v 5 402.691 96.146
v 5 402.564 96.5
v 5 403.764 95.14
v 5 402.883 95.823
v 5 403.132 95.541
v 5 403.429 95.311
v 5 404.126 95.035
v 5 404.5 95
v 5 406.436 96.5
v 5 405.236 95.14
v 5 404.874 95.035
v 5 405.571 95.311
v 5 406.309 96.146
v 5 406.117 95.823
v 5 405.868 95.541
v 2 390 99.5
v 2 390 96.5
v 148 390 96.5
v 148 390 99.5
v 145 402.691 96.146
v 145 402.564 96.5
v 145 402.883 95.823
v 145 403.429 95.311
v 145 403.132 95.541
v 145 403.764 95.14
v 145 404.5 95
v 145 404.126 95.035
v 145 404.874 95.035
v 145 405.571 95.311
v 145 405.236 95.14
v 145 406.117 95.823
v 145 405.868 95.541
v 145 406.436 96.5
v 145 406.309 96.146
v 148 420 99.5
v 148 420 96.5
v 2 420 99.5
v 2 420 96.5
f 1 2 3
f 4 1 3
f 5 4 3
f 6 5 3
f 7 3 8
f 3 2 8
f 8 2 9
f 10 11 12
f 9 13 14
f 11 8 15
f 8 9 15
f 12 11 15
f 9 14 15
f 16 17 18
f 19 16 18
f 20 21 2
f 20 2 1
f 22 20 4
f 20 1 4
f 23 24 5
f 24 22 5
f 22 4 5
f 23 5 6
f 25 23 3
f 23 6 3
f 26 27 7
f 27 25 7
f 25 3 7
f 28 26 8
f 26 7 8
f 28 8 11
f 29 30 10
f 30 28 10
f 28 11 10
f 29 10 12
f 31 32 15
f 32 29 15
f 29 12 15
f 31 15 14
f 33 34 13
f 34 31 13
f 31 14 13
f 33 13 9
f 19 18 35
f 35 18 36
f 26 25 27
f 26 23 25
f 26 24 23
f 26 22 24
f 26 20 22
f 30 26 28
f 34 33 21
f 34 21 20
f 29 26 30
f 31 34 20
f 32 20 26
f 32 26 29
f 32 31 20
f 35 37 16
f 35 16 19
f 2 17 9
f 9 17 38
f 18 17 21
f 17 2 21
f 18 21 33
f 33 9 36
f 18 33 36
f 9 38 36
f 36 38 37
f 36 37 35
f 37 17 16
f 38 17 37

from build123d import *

# Parameters (mm, degrees)
CYLINDER013_R     = 2
CYLINDER013_DEPTH = 140
BOX018_W          = 146
BOX018_H          = 30
BOX018_DEPTH      = 3


with BuildPart() as cilindro012:
    # Cylinder013 → Cylinder013 (new body)
    with BuildSketch(Plane(origin=(5, 404.5, 97), x_dir=(0, 0, -1), z_dir=(1, 0, 0))):
        Circle(CYLINDER013_R)
    extrude(amount=CYLINDER013_DEPTH)


with BuildPart() as fusion014006:
    # Box018 → Box018 (new body)
    with BuildSketch(Plane(origin=(2, 390, 96.5), x_dir=(1, 0, 0), z_dir=(0, 0, 1))):
        with Locations((73, 15)):
            Rectangle(BOX018_W, BOX018_H)
    extrude(amount=BOX018_DEPTH)

    # Fusion014006: union Cilindro012
    add(cilindro012.part)


solid = fusion014006.part
